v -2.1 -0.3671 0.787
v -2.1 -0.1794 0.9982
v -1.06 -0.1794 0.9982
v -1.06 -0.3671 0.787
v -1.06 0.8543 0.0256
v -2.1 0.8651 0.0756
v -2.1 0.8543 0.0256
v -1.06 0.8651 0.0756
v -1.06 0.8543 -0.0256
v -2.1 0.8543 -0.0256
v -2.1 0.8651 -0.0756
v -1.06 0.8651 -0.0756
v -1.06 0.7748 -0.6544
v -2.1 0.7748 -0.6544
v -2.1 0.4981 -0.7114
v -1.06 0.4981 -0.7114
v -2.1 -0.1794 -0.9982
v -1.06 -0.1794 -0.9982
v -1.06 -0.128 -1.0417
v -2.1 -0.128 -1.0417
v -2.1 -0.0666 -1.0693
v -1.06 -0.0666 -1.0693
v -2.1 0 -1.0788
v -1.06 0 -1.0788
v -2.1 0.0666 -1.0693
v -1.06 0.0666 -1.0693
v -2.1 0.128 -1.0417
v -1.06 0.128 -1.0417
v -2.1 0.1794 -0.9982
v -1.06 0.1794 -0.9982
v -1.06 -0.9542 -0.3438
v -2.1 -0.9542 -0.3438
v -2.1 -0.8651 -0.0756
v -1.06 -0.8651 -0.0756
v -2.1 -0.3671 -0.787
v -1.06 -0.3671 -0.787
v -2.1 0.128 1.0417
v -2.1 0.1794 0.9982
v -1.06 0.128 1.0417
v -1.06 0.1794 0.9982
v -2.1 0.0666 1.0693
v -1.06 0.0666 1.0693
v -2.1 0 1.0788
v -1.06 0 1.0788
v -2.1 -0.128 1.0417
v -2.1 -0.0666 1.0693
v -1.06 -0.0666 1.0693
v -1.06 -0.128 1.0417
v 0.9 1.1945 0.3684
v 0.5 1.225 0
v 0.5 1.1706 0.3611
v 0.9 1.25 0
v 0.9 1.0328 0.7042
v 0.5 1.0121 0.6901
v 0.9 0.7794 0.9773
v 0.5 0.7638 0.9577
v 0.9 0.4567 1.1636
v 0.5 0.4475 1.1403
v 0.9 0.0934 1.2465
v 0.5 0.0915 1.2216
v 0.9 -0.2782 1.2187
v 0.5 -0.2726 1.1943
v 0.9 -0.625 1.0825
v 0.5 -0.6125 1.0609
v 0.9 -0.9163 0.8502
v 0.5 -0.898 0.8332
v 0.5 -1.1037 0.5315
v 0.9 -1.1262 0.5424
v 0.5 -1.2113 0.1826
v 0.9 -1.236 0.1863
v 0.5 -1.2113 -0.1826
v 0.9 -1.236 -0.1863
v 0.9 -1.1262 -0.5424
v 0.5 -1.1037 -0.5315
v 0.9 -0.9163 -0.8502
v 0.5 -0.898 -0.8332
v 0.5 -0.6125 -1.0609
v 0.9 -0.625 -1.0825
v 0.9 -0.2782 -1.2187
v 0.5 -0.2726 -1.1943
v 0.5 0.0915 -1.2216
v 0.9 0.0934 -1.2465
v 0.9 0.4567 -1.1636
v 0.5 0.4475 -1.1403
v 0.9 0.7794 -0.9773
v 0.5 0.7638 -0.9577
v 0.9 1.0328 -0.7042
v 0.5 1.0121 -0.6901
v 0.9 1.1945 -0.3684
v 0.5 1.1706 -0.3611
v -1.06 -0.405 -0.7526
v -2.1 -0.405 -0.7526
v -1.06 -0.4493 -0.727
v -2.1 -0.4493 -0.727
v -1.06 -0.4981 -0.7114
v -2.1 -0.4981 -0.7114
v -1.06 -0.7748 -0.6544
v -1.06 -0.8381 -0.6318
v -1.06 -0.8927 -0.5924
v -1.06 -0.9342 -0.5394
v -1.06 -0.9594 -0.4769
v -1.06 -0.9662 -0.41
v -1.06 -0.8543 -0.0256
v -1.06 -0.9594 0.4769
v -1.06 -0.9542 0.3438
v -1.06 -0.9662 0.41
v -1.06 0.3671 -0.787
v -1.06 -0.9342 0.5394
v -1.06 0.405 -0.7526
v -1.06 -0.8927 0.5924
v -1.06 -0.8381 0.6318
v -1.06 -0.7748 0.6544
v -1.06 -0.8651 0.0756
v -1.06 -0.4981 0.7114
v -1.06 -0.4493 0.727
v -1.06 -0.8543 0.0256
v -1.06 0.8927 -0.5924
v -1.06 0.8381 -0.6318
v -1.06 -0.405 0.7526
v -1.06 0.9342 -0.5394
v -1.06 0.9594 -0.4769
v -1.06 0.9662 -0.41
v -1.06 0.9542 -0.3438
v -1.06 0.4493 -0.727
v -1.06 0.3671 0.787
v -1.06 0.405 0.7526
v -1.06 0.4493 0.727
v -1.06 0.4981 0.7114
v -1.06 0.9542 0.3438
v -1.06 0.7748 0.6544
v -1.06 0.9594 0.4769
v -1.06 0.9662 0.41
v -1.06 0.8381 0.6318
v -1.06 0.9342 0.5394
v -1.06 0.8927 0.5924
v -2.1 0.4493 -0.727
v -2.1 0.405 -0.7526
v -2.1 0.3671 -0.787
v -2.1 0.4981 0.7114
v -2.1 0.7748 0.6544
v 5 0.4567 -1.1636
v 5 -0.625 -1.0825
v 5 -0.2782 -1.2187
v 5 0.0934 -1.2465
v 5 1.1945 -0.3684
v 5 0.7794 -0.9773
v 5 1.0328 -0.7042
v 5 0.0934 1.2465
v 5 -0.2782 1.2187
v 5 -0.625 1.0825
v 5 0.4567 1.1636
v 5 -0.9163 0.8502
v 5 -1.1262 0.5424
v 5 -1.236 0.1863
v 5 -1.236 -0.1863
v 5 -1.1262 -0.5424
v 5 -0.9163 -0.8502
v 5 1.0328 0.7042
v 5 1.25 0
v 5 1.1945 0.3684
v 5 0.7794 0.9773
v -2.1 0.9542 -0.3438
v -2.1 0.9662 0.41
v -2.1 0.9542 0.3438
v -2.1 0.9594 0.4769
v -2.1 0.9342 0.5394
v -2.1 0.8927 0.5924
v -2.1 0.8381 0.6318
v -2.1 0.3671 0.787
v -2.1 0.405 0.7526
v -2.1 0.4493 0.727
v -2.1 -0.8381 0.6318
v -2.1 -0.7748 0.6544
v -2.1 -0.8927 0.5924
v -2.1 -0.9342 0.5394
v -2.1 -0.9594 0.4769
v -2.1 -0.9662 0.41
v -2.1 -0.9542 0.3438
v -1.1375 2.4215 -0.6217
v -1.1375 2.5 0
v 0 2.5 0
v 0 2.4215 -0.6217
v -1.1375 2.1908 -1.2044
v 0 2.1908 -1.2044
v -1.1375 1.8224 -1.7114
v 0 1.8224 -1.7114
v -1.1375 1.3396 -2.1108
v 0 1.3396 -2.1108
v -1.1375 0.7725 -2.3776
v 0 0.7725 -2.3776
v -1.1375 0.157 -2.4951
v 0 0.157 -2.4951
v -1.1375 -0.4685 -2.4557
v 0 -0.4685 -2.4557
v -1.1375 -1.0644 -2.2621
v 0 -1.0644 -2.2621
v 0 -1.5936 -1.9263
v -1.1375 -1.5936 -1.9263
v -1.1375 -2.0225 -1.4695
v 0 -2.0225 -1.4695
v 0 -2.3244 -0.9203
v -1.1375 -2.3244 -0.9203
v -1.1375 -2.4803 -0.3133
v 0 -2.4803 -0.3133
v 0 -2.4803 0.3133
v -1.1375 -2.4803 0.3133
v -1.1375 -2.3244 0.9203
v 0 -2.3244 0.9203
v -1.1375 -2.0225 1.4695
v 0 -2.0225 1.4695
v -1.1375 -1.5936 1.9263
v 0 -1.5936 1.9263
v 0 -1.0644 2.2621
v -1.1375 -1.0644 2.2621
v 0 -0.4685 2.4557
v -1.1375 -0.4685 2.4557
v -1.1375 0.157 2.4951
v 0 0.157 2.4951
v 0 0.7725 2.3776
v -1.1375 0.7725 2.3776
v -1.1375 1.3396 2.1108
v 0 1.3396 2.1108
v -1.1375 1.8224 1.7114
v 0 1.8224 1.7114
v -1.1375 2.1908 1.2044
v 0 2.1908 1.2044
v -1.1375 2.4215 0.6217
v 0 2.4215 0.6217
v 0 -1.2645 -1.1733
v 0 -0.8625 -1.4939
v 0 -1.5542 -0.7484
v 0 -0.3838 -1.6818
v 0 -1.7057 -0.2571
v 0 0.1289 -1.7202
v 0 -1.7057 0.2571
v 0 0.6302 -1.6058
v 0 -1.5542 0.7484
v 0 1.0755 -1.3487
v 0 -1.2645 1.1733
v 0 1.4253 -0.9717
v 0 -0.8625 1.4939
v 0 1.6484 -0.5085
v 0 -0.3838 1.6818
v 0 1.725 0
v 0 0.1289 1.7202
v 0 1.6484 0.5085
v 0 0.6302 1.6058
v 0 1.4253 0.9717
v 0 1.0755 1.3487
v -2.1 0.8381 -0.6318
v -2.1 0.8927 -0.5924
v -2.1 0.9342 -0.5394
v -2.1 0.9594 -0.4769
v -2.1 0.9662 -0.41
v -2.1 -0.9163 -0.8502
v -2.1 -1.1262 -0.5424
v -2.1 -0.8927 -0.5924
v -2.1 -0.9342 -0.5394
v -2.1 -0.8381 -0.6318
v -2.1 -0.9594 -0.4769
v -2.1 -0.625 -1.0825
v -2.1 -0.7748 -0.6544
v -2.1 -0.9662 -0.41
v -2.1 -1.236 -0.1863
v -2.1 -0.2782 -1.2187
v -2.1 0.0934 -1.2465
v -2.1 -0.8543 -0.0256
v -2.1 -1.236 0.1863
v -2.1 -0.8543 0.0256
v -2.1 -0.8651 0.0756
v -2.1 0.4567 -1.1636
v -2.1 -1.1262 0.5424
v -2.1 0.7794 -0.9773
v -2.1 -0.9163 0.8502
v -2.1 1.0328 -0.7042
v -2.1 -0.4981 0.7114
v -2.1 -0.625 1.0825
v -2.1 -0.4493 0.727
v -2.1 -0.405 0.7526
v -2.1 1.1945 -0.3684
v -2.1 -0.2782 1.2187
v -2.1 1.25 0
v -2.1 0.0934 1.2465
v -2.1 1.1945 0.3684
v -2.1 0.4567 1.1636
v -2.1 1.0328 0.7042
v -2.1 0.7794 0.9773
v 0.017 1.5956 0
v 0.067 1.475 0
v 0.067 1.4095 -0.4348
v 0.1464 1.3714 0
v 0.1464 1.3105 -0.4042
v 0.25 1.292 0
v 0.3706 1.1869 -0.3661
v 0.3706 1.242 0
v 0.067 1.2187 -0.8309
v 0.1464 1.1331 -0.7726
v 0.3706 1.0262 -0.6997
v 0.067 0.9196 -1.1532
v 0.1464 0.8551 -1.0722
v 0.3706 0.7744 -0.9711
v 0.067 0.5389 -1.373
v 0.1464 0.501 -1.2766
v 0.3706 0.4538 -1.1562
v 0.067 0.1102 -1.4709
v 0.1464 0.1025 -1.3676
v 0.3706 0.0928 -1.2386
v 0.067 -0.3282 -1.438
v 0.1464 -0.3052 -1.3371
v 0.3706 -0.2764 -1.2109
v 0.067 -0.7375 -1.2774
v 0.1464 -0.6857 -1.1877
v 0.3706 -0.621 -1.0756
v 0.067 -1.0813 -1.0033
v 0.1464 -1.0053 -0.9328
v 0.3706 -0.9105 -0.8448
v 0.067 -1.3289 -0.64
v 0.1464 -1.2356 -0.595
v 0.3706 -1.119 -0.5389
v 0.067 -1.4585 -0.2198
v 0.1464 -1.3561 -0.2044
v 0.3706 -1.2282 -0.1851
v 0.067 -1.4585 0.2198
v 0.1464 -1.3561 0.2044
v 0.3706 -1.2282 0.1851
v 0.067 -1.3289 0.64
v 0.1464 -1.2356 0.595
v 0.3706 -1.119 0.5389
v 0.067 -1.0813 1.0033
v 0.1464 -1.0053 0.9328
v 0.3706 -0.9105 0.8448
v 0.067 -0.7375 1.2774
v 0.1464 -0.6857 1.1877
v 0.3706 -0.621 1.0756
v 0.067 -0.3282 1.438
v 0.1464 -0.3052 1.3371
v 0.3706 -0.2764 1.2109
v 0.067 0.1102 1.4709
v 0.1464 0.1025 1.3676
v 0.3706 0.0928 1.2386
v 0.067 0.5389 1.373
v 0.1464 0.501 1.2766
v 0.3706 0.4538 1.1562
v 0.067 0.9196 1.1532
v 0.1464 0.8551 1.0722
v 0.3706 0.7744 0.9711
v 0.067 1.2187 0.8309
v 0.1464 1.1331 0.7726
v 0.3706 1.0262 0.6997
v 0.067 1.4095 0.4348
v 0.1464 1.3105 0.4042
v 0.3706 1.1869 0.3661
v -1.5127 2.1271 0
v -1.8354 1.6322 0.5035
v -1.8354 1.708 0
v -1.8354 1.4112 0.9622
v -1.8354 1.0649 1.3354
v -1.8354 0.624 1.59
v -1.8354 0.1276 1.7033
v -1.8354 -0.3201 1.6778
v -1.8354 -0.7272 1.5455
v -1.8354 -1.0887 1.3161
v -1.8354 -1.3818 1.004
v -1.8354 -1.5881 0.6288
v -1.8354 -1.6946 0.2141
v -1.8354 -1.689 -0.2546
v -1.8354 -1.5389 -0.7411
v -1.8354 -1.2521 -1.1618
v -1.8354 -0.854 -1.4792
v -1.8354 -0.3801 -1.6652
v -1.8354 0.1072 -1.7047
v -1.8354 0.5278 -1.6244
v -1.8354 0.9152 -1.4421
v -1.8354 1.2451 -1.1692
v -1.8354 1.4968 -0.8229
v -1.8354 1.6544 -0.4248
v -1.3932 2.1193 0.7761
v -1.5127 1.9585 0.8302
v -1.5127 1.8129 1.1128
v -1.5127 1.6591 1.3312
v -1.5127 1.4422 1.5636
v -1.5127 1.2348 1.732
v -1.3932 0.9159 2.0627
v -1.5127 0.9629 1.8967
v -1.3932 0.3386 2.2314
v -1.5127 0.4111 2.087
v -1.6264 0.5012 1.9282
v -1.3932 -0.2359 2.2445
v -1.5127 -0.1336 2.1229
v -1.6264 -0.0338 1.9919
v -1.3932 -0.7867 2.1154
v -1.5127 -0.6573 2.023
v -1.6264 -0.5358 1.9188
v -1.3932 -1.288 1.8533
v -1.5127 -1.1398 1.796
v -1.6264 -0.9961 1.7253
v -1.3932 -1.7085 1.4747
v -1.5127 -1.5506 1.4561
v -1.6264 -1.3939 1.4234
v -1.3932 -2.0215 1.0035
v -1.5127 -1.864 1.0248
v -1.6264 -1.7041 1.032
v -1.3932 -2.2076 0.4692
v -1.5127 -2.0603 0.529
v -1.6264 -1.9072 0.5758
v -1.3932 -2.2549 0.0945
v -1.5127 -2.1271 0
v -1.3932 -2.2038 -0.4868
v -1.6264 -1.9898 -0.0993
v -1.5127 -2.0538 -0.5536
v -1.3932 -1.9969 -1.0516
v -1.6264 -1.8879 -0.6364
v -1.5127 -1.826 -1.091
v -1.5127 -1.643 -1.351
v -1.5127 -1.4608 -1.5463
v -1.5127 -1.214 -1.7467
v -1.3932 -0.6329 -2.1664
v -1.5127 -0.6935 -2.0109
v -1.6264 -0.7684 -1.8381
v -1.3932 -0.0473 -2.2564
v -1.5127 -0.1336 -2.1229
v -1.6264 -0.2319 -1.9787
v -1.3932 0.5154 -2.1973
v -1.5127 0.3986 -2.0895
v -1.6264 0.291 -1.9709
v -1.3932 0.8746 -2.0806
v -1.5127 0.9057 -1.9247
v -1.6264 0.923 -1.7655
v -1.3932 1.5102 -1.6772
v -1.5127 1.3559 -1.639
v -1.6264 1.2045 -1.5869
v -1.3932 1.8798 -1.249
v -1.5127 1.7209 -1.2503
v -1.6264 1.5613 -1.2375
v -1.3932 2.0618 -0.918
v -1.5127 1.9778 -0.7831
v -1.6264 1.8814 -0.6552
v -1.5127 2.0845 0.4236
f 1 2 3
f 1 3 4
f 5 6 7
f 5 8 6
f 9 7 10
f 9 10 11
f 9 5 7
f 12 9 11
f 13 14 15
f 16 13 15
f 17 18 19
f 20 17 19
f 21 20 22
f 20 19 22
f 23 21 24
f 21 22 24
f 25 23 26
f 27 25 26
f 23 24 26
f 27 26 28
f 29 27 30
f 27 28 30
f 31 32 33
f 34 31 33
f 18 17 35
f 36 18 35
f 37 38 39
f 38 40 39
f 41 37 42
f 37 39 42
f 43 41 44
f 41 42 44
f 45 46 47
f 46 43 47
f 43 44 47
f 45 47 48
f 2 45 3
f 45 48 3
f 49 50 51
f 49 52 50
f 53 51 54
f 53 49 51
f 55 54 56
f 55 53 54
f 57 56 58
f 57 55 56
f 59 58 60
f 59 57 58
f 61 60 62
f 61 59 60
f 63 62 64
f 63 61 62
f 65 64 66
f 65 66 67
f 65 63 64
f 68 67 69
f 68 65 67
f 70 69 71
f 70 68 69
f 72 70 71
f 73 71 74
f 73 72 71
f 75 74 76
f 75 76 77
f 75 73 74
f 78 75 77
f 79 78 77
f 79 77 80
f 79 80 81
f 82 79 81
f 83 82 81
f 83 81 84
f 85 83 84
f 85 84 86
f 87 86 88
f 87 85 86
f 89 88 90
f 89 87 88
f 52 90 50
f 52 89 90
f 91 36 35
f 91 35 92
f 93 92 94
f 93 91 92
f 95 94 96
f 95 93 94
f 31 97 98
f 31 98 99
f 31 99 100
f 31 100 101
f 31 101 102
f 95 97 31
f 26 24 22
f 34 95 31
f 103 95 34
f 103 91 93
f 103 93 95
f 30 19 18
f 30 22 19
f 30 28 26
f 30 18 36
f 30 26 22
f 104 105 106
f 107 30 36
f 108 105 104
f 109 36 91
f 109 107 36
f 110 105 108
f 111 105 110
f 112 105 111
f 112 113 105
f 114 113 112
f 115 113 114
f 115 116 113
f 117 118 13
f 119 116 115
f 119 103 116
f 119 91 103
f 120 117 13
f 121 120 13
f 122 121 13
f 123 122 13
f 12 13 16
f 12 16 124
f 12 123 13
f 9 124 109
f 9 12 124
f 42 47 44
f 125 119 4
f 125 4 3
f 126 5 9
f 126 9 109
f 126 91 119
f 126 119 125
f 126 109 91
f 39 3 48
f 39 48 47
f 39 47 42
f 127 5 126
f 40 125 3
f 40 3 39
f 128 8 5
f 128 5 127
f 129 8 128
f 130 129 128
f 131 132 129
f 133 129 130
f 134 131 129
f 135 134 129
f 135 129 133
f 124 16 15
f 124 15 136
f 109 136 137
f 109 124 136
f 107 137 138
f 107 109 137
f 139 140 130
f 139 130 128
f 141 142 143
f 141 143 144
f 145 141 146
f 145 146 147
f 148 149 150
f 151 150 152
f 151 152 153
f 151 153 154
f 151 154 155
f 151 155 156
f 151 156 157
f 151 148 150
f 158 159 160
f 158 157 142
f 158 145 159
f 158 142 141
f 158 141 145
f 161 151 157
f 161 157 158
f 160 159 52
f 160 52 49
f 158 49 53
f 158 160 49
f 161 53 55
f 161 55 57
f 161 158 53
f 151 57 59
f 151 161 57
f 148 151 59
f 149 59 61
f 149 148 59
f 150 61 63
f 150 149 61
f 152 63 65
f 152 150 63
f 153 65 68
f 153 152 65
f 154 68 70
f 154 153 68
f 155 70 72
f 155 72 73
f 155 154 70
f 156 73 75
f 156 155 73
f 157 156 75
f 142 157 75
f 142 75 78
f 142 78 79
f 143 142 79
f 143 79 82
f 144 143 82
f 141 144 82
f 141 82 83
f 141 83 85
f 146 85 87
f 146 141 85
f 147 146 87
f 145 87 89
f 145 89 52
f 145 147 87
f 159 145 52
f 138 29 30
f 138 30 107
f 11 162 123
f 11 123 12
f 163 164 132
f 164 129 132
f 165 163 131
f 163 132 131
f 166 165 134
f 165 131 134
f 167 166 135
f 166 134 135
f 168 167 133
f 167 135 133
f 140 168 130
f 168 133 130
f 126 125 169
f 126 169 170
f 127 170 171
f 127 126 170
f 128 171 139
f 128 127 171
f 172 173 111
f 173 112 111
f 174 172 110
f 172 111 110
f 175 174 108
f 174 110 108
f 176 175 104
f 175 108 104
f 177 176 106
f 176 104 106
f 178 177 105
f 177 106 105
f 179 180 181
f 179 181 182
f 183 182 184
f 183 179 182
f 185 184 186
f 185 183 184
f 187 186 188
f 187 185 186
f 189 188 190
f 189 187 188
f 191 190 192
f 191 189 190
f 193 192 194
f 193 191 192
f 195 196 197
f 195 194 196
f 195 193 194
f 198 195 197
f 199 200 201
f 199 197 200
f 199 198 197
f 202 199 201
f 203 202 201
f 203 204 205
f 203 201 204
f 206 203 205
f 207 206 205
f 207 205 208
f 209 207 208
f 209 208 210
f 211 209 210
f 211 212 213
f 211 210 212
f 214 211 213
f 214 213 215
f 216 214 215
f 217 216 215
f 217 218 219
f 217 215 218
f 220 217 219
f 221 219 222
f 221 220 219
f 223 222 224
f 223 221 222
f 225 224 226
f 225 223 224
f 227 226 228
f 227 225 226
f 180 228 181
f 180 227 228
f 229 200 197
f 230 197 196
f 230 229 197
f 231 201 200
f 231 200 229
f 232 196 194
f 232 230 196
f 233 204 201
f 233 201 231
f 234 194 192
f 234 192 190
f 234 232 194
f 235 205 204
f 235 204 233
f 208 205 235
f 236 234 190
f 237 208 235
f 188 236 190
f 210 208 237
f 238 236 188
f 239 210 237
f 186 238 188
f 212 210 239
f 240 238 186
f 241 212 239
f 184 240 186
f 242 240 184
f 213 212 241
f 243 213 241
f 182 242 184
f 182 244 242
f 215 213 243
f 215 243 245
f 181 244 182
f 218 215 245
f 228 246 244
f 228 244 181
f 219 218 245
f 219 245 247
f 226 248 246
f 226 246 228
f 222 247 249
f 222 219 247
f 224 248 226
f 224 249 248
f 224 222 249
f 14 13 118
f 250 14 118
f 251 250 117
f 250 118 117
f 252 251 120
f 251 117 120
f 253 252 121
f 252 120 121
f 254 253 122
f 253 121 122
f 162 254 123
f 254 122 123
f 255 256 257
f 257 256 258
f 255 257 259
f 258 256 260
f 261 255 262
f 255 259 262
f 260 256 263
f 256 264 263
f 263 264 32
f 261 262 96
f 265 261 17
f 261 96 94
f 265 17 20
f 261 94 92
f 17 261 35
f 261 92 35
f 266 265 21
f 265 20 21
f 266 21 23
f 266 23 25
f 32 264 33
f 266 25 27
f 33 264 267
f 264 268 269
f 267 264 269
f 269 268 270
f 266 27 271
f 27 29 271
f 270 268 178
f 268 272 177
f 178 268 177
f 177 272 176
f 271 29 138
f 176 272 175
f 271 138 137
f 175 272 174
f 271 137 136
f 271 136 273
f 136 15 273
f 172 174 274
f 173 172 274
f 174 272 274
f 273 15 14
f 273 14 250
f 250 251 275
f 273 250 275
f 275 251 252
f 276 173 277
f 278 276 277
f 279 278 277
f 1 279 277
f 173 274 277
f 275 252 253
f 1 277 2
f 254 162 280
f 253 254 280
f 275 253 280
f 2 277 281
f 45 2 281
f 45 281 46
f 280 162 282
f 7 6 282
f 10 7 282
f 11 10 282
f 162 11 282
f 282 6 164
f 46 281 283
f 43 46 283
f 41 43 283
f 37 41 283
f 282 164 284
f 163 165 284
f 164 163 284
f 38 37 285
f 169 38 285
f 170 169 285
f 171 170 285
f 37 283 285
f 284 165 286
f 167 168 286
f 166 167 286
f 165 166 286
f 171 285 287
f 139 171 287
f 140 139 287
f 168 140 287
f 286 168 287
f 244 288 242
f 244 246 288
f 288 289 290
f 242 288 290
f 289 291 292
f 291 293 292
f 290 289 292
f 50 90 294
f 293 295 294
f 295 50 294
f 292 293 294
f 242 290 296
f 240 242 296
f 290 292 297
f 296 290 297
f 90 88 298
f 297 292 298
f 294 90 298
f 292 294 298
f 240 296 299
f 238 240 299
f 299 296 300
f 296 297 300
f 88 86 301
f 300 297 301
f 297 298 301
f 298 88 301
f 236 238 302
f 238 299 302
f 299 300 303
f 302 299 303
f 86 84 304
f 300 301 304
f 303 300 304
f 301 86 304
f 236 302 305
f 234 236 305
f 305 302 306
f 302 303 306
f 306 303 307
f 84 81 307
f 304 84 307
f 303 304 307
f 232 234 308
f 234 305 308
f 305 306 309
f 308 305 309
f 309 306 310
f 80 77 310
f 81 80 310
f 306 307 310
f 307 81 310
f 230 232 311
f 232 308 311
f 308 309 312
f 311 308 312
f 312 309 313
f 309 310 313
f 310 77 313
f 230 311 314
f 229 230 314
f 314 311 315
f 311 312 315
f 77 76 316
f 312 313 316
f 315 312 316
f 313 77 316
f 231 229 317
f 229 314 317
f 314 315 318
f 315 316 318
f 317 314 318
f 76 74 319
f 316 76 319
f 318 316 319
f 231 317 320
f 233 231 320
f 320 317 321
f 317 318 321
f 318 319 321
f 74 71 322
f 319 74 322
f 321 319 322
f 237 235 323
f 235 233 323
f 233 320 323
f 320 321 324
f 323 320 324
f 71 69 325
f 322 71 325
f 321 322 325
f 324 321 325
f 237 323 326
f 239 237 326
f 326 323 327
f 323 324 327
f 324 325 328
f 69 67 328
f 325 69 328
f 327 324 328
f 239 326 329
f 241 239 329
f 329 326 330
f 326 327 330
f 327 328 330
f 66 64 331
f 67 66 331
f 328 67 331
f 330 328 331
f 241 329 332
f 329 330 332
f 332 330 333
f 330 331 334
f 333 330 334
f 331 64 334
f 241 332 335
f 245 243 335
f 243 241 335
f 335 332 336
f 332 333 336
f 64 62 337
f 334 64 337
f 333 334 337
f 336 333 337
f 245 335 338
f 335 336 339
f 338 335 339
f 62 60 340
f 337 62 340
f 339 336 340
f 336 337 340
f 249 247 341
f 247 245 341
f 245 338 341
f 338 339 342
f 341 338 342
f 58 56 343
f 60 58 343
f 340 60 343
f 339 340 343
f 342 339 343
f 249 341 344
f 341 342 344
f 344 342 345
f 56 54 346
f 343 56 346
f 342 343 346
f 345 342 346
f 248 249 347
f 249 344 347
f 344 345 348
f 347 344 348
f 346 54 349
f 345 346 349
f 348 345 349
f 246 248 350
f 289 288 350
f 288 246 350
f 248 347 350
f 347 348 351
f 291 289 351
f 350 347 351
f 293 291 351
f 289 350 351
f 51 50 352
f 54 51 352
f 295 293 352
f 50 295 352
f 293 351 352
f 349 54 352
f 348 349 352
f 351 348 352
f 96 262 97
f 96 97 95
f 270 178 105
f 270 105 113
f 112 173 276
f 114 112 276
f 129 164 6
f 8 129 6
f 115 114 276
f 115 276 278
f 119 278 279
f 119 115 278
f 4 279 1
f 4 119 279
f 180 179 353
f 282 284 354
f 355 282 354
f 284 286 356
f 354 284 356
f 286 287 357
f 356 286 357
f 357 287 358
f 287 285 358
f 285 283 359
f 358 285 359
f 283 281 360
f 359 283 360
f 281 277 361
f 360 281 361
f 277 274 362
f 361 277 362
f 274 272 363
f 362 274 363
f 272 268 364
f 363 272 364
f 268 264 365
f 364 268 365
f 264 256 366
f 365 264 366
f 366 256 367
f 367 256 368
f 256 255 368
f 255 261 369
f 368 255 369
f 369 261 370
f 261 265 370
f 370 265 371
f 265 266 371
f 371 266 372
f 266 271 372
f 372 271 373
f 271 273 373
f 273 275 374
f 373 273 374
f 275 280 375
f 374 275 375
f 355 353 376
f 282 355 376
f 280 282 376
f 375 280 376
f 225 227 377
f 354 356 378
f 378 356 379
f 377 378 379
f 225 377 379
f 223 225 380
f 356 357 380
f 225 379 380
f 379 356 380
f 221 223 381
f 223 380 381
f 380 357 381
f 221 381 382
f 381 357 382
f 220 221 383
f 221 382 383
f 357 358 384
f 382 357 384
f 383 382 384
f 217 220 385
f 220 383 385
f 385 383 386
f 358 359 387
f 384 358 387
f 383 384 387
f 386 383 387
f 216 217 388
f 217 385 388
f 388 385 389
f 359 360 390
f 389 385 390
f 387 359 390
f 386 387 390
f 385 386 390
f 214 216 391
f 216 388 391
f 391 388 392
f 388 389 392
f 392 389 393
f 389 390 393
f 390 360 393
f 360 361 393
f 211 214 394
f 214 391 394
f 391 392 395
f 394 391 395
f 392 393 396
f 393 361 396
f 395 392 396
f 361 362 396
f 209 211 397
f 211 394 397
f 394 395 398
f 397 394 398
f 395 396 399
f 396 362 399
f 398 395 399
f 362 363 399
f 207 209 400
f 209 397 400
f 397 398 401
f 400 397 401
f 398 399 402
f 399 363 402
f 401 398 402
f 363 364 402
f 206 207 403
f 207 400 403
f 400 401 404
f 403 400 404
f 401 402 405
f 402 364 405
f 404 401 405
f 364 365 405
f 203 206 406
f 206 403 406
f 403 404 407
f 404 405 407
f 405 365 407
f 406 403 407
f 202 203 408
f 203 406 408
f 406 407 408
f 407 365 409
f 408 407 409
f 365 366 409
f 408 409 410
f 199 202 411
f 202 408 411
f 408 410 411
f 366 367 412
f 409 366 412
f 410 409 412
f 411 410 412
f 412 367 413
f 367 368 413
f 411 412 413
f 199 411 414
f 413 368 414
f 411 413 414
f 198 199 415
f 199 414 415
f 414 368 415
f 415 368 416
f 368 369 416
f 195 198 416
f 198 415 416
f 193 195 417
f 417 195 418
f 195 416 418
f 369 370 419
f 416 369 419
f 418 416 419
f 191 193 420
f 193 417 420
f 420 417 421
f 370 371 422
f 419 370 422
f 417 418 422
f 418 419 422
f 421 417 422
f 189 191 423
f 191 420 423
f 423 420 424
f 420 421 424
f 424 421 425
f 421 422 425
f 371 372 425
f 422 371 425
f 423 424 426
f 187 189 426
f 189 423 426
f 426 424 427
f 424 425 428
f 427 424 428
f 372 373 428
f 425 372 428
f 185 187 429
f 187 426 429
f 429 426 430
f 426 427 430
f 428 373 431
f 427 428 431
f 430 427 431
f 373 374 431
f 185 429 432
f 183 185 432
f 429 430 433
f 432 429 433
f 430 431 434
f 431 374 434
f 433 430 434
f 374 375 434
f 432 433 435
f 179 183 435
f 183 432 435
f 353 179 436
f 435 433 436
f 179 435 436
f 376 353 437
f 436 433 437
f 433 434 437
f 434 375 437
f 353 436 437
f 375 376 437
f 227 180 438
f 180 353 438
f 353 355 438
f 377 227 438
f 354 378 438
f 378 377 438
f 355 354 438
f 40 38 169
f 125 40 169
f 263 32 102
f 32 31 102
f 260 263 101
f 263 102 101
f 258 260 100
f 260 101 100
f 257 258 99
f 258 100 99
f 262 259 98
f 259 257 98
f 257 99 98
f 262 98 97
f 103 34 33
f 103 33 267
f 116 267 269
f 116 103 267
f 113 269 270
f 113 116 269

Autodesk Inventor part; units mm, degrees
ref_plane "YZ Plane" through (0, 0, 0) normal (1, 0, 0) x (0, 1, 0)
ref_plane "XZ Plane" through (0, 0, 0) normal (0, 1, 0) x (-1, 0, 0)
ref_plane "XY Plane" through (0, 0, 0) normal (0, 0, 1) x (1, 0, 0)
sketch "Sketch4" plane through (0, 0, 0) normal (0, 0, 1) x (1, 0, 0)
  line L0 (-2.1, 0) -> (5, 0)
  line L1 (0, 0) -> (-2.1, 0)
  line L2 (0, 2.5) -> (0, 1.725)
  line L3 (0.5, 1.225) -> (0.5, 1.225)
  line L4 (0.5, 1.225) -> (0.9, 1.25)
  arc A0 (0, 1.725) -> (0.5, 1.225) centre (0.5, 1.725) ccw
  line L5 (-2.1, 0) -> (-2.1, 1.25)
  line L6 (0, 2.5) -> (-1.1375, 2.5)
  arc A1 (-1.1375, 2.5) -> (-2.1, 1.25) centre (1.4883, -0.5175) ccw
  line L7 (0.9, 1.25) -> (5, 1.25)
  line L8 (5, 1.25) -> (5, 0)
  point P0 (0, 1.225)
  dimension "d71" = 0.5
  dimension "d72" = 5
  dimension "d74" = 0.4
  dimension "d75" = 2.45
  dimension "d78" = 2.5
  dimension "d82" = 4
  dimension "d83" = 2.1
  dimension "d84" = 5
  dimension "d104" = 4.1
  dimension "d105" = 2.5
revolve "Revolution7" add sketch "Sketch4" angle 360 about axis through (-2.1, 0, 0) along (1, 0, 0)
sketch "Sketch5" plane through (-2.1, 0, 0) normal (-1, 0, 0) x (0, 0, 1)
  circle A0 centre (0, 0) radius 1.2 construction
  circle A1 centre (0, 0) radius 0.84 construction
  line L0 (0, 0) -> (-0.7275, 0.42)
  line L1 (0, 0) -> (-0.7275, -0.42)
  line L2 (-1.8008, 0) -> (1.7887, 0)
  line L3 (-1.2, 0) -> (-0.7275, -0.42)
  line L4 (-1.2, 0) -> (-0.7275, 0.42)
  dimension "d88" = 2.4
  dimension "d89" = 1.68
  dimension "d90" = 30
  dimension "d91" = 30
extrude "Extrusion1" cut sketch "Sketch5" against normal blind 1.04
pattern_circular "Circular Pattern1" count 6 over 360 about axis through (-10, 0, 0) along (1, 0, 0) of "Extrusion1"
fillet "Fillet1" radius 0.24 12 edges at (-1.58, -1.0392, -0.6) (-1.58, -0.42, -0.7275) (-1.58, -0.84, 0) (-1.58, -1.0392, 0.6) (-1.58, -0.42, 0.7275) (-1.58, 0, 1.2) (-1.58, 0.84, 0) (-1.58, 1.0392, 0.6) (-1.58, 0.42, 0.7275) (-1.58, 0.42, -0.7275) (-1.58, 0, -1.2) (-1.58, 1.0392, -0.6)
thread "Thread7" size "M2.5x0.45" class "6g" standard "ISO Metric profile" length 4.1
equation "\"a\" = 0.9"
equation "\"b\" = 4.1"
equation "\"dk\" = 5"
equation "\"k\" = 2.1"
equation "\"r\" = 0.5"
equation "\"rf\" = 4"
equation "\"x\" = 0.4"
equation "\"A_\" = 2.4"
equation "\"t\" = 1.04"
equation "\"p\" = 0.45"
equation "\"l_\" = 5"
equation "\"d\" = 2.5"
equation "\"ds_\" = 2.45"
equation "\"lg\" = 0"
properties part number "Flachkopfschraube mit Innenrund ISO 14583 - M2,5 x 5 - 4.8" material "Steel"
